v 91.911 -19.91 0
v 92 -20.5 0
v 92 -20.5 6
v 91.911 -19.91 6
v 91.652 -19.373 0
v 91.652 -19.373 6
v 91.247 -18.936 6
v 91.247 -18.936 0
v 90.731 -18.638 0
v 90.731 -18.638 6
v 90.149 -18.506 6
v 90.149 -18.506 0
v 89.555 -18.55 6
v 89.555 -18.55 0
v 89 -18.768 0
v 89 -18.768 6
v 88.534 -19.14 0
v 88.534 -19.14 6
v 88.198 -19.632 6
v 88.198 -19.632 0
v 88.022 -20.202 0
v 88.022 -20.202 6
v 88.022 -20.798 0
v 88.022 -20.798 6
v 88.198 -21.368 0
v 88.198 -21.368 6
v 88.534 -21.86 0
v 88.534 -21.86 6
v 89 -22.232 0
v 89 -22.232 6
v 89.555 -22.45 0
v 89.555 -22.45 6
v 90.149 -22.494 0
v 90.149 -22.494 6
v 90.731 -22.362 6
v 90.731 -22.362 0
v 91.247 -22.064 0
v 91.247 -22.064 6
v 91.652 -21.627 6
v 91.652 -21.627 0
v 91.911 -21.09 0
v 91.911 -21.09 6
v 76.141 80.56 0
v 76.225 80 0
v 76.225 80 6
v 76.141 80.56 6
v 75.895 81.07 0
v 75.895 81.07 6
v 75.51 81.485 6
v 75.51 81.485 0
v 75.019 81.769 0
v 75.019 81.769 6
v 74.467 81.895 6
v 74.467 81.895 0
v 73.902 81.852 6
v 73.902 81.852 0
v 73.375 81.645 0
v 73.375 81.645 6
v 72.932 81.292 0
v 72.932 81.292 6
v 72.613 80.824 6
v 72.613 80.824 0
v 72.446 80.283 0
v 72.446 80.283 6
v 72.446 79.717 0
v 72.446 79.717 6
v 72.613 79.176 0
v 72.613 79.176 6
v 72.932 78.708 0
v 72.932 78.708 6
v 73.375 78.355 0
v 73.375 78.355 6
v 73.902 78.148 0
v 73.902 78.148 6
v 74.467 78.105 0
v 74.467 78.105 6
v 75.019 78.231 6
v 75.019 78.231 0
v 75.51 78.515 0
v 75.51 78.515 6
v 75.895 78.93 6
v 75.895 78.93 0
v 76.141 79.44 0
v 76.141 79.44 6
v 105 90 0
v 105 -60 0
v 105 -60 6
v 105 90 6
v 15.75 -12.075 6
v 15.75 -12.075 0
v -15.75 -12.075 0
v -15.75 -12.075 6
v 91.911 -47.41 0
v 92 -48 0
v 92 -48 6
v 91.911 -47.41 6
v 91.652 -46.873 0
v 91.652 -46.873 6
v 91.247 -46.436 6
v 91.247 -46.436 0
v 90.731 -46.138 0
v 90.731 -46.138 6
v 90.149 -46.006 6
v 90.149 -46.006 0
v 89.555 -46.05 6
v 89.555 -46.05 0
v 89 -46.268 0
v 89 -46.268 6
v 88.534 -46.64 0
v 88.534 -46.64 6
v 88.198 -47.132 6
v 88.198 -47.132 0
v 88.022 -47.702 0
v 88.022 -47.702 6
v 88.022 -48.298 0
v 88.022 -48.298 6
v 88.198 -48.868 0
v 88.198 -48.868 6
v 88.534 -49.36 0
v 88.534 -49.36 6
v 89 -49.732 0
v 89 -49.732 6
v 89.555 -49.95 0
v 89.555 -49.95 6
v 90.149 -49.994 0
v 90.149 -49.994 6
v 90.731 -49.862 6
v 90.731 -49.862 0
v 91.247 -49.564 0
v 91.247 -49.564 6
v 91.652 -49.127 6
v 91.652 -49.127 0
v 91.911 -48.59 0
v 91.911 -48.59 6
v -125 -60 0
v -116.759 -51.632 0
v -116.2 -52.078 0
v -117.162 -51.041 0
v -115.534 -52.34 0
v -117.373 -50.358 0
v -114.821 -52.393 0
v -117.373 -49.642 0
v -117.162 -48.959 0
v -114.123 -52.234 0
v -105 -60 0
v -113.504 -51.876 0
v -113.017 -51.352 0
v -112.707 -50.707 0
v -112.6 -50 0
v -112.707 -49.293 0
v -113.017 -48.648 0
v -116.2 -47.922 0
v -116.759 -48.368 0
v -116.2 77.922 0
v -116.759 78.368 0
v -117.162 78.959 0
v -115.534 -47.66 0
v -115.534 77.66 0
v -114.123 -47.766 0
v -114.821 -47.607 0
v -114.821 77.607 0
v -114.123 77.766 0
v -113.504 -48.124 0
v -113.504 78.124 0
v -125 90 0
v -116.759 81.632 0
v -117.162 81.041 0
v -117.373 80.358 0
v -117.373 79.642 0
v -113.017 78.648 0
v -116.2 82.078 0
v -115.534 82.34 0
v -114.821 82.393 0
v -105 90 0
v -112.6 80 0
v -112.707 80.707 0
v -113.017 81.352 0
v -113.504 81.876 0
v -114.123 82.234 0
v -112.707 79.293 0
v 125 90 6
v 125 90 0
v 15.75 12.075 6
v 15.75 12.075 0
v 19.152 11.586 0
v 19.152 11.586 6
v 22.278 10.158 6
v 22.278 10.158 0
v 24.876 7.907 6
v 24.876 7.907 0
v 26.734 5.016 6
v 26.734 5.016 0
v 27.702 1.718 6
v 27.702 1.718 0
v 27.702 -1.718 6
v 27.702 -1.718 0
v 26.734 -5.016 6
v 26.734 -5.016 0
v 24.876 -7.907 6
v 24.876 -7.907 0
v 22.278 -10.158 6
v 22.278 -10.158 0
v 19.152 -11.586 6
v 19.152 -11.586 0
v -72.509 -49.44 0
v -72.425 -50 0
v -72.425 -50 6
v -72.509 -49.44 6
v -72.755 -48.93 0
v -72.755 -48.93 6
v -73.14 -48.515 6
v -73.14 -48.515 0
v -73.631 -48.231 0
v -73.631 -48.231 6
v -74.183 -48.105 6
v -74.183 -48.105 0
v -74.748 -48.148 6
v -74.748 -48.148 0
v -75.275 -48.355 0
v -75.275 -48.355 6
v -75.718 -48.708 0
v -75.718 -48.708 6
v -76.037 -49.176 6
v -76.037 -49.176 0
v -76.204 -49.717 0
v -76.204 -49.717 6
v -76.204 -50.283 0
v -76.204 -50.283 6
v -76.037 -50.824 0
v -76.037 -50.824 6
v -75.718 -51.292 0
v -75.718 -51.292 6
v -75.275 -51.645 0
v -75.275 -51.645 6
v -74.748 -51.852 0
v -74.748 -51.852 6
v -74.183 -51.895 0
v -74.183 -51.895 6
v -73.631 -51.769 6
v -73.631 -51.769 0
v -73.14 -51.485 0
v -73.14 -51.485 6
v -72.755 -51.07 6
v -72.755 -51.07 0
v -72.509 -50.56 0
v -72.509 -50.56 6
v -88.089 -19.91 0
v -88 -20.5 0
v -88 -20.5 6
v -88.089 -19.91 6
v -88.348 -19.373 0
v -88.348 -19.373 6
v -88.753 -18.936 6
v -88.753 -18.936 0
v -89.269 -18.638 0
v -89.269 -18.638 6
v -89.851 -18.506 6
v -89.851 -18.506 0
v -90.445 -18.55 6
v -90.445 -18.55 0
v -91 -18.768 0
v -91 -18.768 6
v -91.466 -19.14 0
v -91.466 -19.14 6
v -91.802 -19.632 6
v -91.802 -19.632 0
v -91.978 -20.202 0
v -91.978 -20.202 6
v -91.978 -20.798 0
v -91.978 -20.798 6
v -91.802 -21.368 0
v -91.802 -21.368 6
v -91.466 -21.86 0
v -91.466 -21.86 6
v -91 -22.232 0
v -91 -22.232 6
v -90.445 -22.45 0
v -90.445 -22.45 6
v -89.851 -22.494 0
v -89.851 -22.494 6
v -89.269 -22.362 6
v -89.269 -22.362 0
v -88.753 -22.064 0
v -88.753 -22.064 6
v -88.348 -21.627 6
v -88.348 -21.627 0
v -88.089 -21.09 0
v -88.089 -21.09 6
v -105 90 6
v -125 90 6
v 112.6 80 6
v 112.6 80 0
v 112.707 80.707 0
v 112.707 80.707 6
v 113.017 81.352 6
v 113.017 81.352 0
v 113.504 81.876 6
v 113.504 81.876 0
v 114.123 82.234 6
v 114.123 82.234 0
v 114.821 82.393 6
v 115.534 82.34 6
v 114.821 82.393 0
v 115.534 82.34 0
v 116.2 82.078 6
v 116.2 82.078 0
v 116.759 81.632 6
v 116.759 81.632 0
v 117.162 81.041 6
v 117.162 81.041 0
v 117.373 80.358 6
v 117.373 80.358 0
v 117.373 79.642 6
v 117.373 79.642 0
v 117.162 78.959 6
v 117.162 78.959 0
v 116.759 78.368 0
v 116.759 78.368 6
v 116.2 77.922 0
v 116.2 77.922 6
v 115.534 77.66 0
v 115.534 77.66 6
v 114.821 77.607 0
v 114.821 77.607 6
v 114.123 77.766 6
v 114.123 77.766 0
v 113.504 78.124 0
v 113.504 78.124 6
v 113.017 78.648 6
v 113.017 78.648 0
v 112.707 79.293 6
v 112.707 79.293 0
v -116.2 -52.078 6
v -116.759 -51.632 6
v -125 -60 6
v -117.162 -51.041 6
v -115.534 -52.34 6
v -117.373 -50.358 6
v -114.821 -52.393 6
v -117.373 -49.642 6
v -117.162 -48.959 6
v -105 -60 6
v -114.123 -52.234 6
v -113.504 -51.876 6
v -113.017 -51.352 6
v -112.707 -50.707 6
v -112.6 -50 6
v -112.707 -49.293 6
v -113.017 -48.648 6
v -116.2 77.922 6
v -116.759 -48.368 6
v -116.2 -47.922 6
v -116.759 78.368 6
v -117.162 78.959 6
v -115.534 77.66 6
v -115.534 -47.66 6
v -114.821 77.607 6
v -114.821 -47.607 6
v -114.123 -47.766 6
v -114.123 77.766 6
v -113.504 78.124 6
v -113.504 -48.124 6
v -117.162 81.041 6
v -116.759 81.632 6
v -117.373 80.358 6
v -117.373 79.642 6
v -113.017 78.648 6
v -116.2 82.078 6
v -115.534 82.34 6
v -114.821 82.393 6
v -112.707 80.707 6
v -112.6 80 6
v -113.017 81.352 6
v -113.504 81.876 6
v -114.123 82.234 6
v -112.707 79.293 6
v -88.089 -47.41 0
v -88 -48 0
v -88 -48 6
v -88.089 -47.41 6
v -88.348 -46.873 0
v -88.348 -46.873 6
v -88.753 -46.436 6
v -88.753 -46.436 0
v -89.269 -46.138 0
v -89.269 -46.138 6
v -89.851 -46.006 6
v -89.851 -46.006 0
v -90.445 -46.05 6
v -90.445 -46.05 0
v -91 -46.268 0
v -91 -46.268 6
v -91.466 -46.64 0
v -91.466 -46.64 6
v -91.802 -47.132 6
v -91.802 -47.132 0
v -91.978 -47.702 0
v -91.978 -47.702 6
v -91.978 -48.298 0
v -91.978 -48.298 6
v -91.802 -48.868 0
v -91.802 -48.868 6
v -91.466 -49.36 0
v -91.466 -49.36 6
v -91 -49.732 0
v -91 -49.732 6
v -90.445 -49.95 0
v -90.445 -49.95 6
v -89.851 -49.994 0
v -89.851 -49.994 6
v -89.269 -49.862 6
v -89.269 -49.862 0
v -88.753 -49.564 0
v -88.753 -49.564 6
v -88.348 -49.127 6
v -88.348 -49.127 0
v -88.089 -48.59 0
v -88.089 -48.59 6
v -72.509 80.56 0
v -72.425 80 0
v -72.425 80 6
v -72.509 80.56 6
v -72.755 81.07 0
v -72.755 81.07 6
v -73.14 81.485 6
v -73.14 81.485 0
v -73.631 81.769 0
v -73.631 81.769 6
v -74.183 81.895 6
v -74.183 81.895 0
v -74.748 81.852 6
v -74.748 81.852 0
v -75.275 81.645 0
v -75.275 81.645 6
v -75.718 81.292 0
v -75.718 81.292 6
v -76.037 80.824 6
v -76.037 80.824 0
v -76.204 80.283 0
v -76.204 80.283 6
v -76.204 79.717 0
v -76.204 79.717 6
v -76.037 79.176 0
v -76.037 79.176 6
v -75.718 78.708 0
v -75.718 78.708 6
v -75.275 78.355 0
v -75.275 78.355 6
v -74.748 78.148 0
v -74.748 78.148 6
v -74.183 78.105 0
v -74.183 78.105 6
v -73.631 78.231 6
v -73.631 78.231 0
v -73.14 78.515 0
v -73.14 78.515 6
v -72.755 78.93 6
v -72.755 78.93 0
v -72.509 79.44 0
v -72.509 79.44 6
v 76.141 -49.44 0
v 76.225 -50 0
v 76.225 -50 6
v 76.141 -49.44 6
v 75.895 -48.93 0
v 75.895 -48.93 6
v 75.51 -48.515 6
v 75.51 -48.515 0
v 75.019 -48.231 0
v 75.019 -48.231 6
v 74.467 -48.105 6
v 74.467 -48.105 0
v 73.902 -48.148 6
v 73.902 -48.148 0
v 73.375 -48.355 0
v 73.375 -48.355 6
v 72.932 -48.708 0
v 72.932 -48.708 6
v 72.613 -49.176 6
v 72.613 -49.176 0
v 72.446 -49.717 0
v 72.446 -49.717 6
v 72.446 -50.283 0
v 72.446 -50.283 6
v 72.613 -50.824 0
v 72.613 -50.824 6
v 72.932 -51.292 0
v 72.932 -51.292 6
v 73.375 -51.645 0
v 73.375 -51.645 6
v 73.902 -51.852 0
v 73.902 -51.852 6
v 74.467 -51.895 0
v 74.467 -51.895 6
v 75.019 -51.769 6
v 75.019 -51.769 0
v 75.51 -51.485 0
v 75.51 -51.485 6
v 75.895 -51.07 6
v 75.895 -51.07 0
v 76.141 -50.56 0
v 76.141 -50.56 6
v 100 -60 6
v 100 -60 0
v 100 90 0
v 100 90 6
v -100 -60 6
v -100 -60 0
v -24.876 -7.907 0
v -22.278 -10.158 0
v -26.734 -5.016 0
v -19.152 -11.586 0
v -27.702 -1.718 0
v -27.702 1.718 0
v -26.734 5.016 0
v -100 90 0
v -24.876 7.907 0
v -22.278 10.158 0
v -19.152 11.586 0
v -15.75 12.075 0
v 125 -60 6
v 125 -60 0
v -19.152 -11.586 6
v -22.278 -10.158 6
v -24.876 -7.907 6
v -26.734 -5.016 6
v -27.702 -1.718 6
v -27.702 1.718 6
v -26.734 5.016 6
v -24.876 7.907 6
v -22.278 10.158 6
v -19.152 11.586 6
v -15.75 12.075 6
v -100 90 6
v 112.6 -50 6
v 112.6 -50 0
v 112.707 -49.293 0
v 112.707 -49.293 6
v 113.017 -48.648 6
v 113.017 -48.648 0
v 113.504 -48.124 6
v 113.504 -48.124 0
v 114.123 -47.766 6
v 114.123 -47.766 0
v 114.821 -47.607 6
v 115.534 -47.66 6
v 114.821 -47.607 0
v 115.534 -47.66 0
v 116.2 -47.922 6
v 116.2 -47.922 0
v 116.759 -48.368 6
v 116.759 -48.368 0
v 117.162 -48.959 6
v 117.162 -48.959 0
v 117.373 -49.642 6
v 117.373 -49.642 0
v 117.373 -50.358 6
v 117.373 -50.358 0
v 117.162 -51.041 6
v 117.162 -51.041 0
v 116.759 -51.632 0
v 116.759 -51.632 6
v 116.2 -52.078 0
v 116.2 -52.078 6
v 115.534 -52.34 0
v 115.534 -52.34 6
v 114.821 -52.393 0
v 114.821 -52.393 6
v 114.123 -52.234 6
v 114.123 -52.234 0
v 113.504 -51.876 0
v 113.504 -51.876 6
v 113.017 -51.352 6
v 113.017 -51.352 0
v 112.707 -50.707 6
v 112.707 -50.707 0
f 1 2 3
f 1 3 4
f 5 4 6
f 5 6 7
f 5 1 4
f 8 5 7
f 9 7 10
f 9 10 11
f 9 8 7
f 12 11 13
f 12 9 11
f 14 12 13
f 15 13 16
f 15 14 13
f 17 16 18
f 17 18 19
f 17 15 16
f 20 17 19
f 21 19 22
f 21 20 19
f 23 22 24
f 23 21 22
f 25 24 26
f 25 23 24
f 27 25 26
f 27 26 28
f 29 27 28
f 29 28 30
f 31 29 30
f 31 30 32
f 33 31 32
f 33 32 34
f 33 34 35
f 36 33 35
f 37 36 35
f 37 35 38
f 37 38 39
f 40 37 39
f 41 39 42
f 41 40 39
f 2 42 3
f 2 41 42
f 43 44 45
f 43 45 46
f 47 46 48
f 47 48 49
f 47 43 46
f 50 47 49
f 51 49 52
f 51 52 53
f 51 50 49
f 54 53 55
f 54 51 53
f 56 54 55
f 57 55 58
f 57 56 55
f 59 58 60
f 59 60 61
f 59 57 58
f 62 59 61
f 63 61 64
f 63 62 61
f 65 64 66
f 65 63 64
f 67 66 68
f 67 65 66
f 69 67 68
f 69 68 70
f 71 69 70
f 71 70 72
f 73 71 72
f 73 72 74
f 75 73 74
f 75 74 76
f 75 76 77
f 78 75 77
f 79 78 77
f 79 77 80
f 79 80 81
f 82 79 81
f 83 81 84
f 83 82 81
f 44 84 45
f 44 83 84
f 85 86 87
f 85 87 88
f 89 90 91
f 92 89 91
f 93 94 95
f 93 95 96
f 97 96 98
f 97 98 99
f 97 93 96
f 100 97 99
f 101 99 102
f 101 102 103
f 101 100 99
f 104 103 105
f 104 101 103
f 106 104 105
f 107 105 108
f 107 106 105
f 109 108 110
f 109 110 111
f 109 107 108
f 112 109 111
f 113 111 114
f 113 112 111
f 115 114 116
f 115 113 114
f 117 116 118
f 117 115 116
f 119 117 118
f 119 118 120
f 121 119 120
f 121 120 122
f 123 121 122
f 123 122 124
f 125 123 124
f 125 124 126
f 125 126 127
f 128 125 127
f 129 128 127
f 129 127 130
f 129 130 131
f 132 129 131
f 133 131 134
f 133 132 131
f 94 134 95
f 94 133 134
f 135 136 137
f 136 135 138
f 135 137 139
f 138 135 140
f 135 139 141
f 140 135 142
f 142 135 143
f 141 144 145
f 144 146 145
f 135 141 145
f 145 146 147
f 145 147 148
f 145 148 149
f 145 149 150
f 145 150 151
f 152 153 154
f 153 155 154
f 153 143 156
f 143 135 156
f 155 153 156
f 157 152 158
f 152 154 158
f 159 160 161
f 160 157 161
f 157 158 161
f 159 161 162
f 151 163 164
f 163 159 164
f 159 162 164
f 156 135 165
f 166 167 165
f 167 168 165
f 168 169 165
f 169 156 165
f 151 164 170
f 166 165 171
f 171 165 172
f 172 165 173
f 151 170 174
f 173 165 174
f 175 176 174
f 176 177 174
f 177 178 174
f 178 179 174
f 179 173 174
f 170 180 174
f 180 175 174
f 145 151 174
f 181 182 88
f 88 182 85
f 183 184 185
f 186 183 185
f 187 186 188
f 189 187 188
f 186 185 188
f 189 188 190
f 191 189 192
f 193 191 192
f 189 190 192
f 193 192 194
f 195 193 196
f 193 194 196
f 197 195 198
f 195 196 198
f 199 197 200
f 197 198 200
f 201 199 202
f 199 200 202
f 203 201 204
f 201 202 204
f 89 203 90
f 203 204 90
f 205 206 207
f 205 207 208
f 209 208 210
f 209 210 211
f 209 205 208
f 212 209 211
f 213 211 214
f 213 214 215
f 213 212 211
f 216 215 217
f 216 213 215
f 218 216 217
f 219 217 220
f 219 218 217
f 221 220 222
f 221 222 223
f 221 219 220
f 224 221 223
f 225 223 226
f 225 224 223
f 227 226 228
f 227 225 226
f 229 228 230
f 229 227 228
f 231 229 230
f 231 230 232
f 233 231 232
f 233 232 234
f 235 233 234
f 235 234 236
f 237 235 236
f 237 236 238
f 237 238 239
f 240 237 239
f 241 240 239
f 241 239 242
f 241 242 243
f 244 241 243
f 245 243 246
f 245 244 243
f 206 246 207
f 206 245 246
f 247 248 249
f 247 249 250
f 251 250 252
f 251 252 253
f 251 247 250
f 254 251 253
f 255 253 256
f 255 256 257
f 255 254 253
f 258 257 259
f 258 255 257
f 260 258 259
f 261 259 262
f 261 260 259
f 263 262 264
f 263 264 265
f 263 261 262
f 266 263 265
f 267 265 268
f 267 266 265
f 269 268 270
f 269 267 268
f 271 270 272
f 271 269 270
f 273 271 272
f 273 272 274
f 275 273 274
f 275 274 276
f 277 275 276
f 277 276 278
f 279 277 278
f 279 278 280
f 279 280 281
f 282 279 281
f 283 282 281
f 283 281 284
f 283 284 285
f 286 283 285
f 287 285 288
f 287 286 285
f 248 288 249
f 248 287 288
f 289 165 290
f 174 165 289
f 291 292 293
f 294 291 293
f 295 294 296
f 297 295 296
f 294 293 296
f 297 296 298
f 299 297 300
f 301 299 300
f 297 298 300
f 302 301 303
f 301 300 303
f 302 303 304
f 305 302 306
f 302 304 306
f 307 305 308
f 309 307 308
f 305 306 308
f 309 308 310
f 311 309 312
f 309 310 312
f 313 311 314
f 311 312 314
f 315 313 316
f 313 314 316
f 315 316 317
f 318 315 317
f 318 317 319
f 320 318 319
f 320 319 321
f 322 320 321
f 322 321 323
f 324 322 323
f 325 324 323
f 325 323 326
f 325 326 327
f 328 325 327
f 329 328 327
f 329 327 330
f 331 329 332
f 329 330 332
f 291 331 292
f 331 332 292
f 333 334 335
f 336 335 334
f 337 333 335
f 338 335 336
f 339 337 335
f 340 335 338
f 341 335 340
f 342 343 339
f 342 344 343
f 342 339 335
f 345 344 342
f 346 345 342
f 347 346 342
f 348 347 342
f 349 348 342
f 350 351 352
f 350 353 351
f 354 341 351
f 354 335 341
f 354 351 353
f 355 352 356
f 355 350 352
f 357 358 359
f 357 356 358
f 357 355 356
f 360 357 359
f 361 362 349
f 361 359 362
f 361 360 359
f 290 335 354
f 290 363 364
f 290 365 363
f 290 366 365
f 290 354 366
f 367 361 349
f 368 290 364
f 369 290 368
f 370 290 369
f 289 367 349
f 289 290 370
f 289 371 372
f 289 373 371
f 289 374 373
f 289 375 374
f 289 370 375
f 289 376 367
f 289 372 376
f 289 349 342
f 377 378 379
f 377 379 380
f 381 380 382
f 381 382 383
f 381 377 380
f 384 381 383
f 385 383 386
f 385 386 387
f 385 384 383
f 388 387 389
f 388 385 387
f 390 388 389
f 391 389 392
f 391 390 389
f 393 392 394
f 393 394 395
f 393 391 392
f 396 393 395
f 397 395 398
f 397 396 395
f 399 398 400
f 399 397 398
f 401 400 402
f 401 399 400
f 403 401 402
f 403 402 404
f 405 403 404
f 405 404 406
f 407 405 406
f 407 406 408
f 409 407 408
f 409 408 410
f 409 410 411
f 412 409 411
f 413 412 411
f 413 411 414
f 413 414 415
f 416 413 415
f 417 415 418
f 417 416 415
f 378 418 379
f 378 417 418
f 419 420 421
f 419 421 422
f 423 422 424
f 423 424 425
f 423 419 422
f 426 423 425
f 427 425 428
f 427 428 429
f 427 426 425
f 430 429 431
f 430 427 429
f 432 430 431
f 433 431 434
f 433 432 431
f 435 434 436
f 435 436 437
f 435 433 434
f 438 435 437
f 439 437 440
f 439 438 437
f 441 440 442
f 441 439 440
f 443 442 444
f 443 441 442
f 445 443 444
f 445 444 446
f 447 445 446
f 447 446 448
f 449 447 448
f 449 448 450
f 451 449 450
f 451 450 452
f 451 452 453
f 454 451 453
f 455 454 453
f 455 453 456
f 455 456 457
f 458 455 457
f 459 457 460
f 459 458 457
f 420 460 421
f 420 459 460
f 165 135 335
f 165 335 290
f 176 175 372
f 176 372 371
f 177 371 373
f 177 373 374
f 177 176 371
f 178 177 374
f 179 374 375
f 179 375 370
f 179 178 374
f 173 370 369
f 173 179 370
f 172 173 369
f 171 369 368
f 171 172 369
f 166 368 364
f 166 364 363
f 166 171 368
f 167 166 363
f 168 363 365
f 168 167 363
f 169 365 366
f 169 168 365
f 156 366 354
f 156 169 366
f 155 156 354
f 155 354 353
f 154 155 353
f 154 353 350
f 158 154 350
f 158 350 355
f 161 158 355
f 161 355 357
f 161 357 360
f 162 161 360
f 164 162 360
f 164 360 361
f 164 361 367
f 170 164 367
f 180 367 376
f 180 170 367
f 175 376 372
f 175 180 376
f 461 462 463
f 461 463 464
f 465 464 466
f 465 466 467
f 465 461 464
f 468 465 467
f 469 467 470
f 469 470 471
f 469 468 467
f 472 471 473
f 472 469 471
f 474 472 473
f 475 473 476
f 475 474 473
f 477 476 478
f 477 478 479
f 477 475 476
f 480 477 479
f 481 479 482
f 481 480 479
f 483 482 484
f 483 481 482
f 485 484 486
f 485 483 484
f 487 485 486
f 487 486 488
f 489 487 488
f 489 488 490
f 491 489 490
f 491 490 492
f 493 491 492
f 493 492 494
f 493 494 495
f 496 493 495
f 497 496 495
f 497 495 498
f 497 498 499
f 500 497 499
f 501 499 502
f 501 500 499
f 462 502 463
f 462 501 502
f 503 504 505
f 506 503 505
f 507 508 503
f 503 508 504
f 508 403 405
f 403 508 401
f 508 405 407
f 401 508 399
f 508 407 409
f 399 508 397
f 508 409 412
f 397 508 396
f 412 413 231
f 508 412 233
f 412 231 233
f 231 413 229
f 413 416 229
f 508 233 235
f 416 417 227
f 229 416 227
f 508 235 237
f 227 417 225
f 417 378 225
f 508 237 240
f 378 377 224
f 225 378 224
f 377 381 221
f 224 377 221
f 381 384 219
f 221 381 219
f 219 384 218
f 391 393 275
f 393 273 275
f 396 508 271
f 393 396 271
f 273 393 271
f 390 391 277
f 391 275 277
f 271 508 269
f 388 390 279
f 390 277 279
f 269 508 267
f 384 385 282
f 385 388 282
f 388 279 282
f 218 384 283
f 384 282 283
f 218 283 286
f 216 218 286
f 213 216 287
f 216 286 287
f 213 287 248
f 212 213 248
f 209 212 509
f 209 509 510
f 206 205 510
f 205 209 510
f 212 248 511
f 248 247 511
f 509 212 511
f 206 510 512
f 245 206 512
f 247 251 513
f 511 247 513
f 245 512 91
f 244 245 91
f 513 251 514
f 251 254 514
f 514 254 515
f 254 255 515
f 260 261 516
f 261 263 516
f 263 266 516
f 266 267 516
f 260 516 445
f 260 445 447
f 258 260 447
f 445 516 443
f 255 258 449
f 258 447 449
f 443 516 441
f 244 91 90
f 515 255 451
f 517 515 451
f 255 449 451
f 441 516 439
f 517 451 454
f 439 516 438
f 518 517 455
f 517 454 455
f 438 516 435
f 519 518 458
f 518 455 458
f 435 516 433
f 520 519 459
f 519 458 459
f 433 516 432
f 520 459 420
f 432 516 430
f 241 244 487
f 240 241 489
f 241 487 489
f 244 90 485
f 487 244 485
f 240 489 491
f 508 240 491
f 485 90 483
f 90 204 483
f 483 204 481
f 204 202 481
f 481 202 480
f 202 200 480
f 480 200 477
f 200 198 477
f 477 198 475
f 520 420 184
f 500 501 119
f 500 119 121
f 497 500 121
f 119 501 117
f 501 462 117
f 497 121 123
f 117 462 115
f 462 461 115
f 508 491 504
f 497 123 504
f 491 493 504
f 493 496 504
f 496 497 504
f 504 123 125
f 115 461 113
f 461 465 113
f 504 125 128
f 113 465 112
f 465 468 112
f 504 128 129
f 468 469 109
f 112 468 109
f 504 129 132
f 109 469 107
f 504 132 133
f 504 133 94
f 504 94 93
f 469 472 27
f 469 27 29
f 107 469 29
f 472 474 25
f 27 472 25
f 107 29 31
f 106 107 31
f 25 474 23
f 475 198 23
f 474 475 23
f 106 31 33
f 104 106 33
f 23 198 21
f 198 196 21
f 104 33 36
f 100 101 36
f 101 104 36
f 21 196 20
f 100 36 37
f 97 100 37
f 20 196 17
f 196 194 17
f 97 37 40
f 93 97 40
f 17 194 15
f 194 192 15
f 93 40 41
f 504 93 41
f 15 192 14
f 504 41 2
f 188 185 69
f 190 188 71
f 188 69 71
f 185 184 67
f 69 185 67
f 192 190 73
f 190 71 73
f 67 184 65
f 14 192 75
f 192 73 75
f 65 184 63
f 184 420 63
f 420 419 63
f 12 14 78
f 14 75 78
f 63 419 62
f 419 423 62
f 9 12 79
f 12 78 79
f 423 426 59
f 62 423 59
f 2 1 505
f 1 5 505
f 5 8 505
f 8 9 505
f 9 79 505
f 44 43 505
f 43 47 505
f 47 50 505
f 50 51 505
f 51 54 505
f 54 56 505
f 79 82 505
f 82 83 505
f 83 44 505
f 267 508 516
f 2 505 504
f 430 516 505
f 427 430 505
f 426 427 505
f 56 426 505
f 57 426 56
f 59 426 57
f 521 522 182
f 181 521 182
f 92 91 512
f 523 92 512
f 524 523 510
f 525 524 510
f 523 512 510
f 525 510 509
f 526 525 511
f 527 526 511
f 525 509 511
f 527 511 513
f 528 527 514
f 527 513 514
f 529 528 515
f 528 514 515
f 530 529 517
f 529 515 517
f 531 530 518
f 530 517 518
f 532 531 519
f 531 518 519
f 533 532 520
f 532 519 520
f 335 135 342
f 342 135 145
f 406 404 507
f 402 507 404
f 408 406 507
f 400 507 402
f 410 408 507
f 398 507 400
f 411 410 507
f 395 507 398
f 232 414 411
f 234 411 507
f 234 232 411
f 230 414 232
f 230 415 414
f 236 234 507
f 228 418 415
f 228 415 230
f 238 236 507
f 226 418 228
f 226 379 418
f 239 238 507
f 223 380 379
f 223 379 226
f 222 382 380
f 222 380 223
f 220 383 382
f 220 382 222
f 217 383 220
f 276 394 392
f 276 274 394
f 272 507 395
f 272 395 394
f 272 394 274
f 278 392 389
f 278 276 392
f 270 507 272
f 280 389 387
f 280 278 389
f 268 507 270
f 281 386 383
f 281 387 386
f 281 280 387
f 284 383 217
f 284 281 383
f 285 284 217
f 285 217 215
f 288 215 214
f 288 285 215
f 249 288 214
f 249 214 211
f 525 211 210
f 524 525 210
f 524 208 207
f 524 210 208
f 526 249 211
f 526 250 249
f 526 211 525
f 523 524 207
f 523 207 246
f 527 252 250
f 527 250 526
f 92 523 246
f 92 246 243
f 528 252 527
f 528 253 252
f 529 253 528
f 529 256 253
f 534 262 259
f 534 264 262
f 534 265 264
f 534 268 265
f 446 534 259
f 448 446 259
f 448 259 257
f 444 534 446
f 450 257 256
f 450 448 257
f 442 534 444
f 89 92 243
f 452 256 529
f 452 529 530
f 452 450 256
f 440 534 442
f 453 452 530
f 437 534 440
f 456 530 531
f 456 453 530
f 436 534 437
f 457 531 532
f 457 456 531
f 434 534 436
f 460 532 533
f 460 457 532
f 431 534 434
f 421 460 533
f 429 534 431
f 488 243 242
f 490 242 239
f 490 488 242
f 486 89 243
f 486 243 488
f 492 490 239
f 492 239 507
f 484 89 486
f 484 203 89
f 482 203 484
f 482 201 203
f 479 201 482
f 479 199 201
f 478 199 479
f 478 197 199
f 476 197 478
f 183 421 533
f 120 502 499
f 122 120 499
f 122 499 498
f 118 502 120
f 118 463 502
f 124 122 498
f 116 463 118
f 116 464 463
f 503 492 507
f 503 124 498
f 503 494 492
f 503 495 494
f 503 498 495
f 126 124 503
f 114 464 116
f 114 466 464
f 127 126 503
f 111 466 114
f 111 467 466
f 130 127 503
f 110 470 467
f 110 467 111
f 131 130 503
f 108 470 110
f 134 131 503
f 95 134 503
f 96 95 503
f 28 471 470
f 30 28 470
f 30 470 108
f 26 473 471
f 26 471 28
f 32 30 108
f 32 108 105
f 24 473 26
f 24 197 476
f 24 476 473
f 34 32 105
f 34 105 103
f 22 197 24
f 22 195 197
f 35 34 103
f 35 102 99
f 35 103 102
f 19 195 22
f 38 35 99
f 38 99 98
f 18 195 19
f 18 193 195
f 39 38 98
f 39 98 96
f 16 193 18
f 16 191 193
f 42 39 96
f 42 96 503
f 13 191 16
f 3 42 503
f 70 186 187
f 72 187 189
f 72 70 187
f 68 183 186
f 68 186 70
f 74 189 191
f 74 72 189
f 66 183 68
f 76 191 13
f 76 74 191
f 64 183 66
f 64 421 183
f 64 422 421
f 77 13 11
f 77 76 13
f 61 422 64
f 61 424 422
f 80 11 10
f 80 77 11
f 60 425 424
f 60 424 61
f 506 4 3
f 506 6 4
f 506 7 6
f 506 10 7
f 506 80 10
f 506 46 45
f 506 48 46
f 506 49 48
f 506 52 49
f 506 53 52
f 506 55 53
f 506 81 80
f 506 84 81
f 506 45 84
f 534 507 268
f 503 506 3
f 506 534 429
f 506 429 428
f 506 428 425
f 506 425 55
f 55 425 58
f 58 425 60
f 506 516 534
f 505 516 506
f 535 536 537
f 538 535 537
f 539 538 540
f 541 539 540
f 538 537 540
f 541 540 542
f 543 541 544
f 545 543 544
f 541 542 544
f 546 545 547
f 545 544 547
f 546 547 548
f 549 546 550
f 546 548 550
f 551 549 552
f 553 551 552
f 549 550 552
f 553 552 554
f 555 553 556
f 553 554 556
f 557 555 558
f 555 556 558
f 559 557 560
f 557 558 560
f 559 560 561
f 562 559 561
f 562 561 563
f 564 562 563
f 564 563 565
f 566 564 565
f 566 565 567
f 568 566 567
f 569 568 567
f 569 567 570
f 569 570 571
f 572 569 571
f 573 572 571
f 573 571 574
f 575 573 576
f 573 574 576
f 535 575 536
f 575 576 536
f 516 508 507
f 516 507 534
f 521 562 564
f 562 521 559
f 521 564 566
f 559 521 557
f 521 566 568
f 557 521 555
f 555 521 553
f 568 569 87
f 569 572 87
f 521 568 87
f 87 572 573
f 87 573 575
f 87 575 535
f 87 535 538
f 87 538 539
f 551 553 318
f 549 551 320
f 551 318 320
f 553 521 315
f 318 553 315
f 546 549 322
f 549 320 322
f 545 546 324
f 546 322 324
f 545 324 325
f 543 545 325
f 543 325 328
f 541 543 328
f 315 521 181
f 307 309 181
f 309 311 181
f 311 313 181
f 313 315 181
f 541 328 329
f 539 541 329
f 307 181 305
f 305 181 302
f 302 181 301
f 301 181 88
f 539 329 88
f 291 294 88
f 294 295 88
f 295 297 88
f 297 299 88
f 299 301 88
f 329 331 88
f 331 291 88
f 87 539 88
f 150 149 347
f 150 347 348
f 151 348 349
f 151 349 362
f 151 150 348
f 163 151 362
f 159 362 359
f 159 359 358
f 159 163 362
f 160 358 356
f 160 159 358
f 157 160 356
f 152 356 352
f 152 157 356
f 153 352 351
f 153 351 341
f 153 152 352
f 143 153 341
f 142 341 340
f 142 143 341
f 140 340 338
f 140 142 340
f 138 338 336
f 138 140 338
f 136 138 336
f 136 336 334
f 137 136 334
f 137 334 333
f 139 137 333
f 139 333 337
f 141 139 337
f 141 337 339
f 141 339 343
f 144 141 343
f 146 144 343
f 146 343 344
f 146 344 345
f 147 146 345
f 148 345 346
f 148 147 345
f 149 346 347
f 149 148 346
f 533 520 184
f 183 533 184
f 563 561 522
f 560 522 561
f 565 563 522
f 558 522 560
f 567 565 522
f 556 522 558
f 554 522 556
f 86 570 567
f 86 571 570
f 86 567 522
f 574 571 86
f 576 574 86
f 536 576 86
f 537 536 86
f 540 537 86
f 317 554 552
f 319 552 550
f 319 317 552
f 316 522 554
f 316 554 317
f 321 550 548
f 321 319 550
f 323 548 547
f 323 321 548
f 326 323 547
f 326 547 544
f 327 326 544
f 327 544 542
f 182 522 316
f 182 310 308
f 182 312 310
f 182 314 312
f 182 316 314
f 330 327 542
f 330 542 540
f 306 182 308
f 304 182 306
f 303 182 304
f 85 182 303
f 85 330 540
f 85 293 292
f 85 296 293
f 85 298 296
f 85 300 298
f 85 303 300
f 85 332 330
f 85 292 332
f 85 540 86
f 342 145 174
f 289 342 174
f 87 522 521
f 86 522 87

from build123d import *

# Parameters (mm, degrees)
F4_W     = 20
F4_H     = 150
F4_R     = 2.4
F5_DEPTH = 6
F3_W     = 200
F3_H     = 150
F3_R     = 2
F3_R_2   = 1.9


# Not quite as in the source:
# - a pattern or mirror of a feature is missing from the dataset's text; its kind, count and spacing are read off the source's solid
# - a feature names something its author has since deleted; it is built from what else it names


with BuildPart() as f5:
    # F4 (on Top) → F5 (new body)
    with BuildSketch(Plane.XY):
        with Locations((-115, 15)):
            Rectangle(F4_W, F4_H)
        with Locations((-115, -50)):
            Circle(F4_R, mode=Mode.SUBTRACT)
        with Locations((-115, 80)):
            Circle(F4_R, mode=Mode.SUBTRACT)
    extrude(amount=F5_DEPTH)


with BuildPart() as f5b:
    # F3 (on Top) → F5, piece 2 (new body)
    with BuildSketch(Plane.XY):
        with Locations((0, 15)):
            Rectangle(F3_W, F3_H)
        with Locations((-90, -48)):
            Circle(F3_R, mode=Mode.SUBTRACT)
        with Locations((-74.325, -50)):
            Circle(F3_R_2, mode=Mode.SUBTRACT)
        with Locations((-90, -20.5)):
            Circle(F3_R, mode=Mode.SUBTRACT)
        with Locations((74.325, -50)):
            Circle(F3_R_2, mode=Mode.SUBTRACT)
        with Locations((90, -48)):
            Circle(F3_R, mode=Mode.SUBTRACT)
        with BuildLine():
            ThreePointArc((-15.75, -12.075), (-27.825, 0), (-15.75, 12.075))
            Line((-15.75, 12.075), (15.75, 12.075))
            ThreePointArc((15.75, 12.075), (27.825, 0), (15.75, -12.075))
            Line((15.75, -12.075), (-15.75, -12.075))
        make_face(mode=Mode.SUBTRACT)
        with Locations((90, -20.5)):
            Circle(F3_R, mode=Mode.SUBTRACT)
        with Locations((-74.325, 80)):
            Circle(F3_R_2, mode=Mode.SUBTRACT)
        with Locations((74.325, 80)):
            Circle(F3_R_2, mode=Mode.SUBTRACT)
    extrude(amount=F5_DEPTH)


with BuildPart() as f5_copies_1:
    # F5_copies: instance of F5
    add(f5.part.mirror(Plane(origin=(0, 0, 0), x_dir=(0, 0, 1), z_dir=(1, 0, 0))))


solid = Compound([f5.part, f5b.part, f5_copies_1.part])
